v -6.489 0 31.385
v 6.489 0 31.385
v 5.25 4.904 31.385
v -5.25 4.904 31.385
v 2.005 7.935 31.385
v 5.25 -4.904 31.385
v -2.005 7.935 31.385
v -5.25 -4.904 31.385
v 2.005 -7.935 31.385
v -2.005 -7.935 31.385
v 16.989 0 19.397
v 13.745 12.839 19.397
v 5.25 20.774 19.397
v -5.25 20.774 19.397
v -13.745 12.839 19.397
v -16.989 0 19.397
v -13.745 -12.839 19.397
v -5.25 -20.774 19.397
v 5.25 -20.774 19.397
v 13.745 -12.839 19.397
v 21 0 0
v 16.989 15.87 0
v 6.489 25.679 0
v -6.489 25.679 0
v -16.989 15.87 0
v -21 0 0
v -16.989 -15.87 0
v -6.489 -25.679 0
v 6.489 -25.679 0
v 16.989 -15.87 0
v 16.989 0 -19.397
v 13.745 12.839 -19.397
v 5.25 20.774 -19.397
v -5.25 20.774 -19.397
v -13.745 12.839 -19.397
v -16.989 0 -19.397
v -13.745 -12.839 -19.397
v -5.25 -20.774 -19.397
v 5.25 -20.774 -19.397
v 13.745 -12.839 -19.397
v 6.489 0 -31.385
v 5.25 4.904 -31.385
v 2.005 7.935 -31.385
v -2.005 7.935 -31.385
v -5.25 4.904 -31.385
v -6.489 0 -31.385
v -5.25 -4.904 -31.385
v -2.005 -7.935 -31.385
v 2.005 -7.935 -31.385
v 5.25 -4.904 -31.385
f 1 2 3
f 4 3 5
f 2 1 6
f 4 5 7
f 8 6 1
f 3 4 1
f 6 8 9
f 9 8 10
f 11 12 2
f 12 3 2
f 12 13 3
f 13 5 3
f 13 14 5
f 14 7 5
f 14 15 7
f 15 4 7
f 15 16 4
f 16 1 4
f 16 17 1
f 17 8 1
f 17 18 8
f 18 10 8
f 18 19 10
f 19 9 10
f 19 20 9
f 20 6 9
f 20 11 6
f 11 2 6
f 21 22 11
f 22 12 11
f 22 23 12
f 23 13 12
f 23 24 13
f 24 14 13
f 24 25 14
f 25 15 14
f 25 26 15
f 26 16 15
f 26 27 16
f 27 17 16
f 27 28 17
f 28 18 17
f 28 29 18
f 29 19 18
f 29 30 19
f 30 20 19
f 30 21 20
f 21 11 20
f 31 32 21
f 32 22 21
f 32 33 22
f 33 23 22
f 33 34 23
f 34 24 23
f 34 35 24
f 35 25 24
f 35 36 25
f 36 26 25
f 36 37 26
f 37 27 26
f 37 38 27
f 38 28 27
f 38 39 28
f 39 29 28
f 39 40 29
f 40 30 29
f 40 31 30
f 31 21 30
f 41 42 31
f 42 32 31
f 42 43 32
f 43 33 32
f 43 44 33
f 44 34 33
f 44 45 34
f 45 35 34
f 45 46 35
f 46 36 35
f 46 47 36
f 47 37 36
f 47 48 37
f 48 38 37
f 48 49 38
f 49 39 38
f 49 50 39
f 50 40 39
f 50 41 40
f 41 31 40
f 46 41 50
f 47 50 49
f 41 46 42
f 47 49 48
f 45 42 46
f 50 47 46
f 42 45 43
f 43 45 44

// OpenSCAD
// Generated by SolidPython 1.0.1 on 2020-07-29 00:46:47


scale(v = [7, 9, 11]) {
	sphere(r = 3);
}
/***********************************************
*********      SolidPython code:      **********
************************************************
 
# import packages: SolidPython
from solid import *
from solid.utils import *
from itertools import chain, combinations, permutations


class Resize:

    def __init__(self, scad_file):
        self.scad_file = scad_file
        #self.scad_file = import_scad(scad_file)
        # cone/cylinder param:
        self.r1 = 0
        self.r2 = 0
        self.h = 0
        # rectangular prism param:
        self.w = 0
        self.l = 0
        # ellipse param:
        self.r = 0

    # import OpenScad code (file name corresponds to shape)


    # classify shape + parameters
    def assign(self, param1, param2, param3):
        if self.scad_file == 'cone.scad':
            self.r1 = param1
            self.r2 = param2
            self.h = param3
        elif self.scad_file == 'cylinder.scad':
            self.r1 = param1
            self.r2 = param2
            self.h = param3
        elif self.scad_file == 'rectangularPrism.scad':
            self.h = param1
            self.l = param2
            self.w = param3
        else:
            self.r = param1
            self.h = param2

    # resize parameters
    def iterate(self):
        x = range(3, 20, 2)
        i = 1
        if self.scad_file == 'cone.scad':
            tempList = list(permutations(x, 2))
            for temp in tempList:
                param1 = temp[0]
                param2 = temp[1]
                filepath = 'produced_scad_files/' + 'cone' + str(param1) + '_' + str(param2) + '_' + '.scad'
                scad_render_to_file(cylinder(h=param1, r1=param2, r2=0), filepath)

        elif self.scad_file == 'cylinder.scad':
            tempList = list(permutations(x, 3))
            for temp in tempList:
                param1 = temp[0]
                param2 = temp[1]
                filepath = 'produced_scad_files/' + 'cylinder' + str(param1) + '_' + str(param2) + '_' + '.scad'
                scad_render_to_file(cylinder(h=param1, r1=param2, r2=param2), filepath)

        elif self.scad_file == 'rectangularPrism.scad':
            tempList = list(permutations(x, 3))
            for temp in tempList:
                param1 = temp[0]
                param2 = temp[1]
                param3 = temp[2]
                filepath = 'produced_scad_files/' + 'rectangularPrism' + str(param1) + '_' + str(param2) + '_' + str(
                    param3) + '.scad'
                scad_render_to_file(cube(size=(param1, param2, param3)), filepath)

        elif self.scad_file == 'ellipse.scad':
            tempList = list(permutations(x, 4))
            for temp in tempList:
                param1 = temp[0]
                param2 = temp[1]
                param3 = temp[2]
                param4 = temp[3]
                filepath = 'produced_scad_files/' + 'ellipse' + str(param1) + '_' + str(param2) + '_' + str(param3) + '_' + str(param4) + '.scad'
                scad_render_to_file(scale([param1, param2, param3])(sphere(r=param4)), filepath)

    def render_to_scadfile(self):
        scad_render_to_file(scad, 'example.scad') 
 
************************************************/
